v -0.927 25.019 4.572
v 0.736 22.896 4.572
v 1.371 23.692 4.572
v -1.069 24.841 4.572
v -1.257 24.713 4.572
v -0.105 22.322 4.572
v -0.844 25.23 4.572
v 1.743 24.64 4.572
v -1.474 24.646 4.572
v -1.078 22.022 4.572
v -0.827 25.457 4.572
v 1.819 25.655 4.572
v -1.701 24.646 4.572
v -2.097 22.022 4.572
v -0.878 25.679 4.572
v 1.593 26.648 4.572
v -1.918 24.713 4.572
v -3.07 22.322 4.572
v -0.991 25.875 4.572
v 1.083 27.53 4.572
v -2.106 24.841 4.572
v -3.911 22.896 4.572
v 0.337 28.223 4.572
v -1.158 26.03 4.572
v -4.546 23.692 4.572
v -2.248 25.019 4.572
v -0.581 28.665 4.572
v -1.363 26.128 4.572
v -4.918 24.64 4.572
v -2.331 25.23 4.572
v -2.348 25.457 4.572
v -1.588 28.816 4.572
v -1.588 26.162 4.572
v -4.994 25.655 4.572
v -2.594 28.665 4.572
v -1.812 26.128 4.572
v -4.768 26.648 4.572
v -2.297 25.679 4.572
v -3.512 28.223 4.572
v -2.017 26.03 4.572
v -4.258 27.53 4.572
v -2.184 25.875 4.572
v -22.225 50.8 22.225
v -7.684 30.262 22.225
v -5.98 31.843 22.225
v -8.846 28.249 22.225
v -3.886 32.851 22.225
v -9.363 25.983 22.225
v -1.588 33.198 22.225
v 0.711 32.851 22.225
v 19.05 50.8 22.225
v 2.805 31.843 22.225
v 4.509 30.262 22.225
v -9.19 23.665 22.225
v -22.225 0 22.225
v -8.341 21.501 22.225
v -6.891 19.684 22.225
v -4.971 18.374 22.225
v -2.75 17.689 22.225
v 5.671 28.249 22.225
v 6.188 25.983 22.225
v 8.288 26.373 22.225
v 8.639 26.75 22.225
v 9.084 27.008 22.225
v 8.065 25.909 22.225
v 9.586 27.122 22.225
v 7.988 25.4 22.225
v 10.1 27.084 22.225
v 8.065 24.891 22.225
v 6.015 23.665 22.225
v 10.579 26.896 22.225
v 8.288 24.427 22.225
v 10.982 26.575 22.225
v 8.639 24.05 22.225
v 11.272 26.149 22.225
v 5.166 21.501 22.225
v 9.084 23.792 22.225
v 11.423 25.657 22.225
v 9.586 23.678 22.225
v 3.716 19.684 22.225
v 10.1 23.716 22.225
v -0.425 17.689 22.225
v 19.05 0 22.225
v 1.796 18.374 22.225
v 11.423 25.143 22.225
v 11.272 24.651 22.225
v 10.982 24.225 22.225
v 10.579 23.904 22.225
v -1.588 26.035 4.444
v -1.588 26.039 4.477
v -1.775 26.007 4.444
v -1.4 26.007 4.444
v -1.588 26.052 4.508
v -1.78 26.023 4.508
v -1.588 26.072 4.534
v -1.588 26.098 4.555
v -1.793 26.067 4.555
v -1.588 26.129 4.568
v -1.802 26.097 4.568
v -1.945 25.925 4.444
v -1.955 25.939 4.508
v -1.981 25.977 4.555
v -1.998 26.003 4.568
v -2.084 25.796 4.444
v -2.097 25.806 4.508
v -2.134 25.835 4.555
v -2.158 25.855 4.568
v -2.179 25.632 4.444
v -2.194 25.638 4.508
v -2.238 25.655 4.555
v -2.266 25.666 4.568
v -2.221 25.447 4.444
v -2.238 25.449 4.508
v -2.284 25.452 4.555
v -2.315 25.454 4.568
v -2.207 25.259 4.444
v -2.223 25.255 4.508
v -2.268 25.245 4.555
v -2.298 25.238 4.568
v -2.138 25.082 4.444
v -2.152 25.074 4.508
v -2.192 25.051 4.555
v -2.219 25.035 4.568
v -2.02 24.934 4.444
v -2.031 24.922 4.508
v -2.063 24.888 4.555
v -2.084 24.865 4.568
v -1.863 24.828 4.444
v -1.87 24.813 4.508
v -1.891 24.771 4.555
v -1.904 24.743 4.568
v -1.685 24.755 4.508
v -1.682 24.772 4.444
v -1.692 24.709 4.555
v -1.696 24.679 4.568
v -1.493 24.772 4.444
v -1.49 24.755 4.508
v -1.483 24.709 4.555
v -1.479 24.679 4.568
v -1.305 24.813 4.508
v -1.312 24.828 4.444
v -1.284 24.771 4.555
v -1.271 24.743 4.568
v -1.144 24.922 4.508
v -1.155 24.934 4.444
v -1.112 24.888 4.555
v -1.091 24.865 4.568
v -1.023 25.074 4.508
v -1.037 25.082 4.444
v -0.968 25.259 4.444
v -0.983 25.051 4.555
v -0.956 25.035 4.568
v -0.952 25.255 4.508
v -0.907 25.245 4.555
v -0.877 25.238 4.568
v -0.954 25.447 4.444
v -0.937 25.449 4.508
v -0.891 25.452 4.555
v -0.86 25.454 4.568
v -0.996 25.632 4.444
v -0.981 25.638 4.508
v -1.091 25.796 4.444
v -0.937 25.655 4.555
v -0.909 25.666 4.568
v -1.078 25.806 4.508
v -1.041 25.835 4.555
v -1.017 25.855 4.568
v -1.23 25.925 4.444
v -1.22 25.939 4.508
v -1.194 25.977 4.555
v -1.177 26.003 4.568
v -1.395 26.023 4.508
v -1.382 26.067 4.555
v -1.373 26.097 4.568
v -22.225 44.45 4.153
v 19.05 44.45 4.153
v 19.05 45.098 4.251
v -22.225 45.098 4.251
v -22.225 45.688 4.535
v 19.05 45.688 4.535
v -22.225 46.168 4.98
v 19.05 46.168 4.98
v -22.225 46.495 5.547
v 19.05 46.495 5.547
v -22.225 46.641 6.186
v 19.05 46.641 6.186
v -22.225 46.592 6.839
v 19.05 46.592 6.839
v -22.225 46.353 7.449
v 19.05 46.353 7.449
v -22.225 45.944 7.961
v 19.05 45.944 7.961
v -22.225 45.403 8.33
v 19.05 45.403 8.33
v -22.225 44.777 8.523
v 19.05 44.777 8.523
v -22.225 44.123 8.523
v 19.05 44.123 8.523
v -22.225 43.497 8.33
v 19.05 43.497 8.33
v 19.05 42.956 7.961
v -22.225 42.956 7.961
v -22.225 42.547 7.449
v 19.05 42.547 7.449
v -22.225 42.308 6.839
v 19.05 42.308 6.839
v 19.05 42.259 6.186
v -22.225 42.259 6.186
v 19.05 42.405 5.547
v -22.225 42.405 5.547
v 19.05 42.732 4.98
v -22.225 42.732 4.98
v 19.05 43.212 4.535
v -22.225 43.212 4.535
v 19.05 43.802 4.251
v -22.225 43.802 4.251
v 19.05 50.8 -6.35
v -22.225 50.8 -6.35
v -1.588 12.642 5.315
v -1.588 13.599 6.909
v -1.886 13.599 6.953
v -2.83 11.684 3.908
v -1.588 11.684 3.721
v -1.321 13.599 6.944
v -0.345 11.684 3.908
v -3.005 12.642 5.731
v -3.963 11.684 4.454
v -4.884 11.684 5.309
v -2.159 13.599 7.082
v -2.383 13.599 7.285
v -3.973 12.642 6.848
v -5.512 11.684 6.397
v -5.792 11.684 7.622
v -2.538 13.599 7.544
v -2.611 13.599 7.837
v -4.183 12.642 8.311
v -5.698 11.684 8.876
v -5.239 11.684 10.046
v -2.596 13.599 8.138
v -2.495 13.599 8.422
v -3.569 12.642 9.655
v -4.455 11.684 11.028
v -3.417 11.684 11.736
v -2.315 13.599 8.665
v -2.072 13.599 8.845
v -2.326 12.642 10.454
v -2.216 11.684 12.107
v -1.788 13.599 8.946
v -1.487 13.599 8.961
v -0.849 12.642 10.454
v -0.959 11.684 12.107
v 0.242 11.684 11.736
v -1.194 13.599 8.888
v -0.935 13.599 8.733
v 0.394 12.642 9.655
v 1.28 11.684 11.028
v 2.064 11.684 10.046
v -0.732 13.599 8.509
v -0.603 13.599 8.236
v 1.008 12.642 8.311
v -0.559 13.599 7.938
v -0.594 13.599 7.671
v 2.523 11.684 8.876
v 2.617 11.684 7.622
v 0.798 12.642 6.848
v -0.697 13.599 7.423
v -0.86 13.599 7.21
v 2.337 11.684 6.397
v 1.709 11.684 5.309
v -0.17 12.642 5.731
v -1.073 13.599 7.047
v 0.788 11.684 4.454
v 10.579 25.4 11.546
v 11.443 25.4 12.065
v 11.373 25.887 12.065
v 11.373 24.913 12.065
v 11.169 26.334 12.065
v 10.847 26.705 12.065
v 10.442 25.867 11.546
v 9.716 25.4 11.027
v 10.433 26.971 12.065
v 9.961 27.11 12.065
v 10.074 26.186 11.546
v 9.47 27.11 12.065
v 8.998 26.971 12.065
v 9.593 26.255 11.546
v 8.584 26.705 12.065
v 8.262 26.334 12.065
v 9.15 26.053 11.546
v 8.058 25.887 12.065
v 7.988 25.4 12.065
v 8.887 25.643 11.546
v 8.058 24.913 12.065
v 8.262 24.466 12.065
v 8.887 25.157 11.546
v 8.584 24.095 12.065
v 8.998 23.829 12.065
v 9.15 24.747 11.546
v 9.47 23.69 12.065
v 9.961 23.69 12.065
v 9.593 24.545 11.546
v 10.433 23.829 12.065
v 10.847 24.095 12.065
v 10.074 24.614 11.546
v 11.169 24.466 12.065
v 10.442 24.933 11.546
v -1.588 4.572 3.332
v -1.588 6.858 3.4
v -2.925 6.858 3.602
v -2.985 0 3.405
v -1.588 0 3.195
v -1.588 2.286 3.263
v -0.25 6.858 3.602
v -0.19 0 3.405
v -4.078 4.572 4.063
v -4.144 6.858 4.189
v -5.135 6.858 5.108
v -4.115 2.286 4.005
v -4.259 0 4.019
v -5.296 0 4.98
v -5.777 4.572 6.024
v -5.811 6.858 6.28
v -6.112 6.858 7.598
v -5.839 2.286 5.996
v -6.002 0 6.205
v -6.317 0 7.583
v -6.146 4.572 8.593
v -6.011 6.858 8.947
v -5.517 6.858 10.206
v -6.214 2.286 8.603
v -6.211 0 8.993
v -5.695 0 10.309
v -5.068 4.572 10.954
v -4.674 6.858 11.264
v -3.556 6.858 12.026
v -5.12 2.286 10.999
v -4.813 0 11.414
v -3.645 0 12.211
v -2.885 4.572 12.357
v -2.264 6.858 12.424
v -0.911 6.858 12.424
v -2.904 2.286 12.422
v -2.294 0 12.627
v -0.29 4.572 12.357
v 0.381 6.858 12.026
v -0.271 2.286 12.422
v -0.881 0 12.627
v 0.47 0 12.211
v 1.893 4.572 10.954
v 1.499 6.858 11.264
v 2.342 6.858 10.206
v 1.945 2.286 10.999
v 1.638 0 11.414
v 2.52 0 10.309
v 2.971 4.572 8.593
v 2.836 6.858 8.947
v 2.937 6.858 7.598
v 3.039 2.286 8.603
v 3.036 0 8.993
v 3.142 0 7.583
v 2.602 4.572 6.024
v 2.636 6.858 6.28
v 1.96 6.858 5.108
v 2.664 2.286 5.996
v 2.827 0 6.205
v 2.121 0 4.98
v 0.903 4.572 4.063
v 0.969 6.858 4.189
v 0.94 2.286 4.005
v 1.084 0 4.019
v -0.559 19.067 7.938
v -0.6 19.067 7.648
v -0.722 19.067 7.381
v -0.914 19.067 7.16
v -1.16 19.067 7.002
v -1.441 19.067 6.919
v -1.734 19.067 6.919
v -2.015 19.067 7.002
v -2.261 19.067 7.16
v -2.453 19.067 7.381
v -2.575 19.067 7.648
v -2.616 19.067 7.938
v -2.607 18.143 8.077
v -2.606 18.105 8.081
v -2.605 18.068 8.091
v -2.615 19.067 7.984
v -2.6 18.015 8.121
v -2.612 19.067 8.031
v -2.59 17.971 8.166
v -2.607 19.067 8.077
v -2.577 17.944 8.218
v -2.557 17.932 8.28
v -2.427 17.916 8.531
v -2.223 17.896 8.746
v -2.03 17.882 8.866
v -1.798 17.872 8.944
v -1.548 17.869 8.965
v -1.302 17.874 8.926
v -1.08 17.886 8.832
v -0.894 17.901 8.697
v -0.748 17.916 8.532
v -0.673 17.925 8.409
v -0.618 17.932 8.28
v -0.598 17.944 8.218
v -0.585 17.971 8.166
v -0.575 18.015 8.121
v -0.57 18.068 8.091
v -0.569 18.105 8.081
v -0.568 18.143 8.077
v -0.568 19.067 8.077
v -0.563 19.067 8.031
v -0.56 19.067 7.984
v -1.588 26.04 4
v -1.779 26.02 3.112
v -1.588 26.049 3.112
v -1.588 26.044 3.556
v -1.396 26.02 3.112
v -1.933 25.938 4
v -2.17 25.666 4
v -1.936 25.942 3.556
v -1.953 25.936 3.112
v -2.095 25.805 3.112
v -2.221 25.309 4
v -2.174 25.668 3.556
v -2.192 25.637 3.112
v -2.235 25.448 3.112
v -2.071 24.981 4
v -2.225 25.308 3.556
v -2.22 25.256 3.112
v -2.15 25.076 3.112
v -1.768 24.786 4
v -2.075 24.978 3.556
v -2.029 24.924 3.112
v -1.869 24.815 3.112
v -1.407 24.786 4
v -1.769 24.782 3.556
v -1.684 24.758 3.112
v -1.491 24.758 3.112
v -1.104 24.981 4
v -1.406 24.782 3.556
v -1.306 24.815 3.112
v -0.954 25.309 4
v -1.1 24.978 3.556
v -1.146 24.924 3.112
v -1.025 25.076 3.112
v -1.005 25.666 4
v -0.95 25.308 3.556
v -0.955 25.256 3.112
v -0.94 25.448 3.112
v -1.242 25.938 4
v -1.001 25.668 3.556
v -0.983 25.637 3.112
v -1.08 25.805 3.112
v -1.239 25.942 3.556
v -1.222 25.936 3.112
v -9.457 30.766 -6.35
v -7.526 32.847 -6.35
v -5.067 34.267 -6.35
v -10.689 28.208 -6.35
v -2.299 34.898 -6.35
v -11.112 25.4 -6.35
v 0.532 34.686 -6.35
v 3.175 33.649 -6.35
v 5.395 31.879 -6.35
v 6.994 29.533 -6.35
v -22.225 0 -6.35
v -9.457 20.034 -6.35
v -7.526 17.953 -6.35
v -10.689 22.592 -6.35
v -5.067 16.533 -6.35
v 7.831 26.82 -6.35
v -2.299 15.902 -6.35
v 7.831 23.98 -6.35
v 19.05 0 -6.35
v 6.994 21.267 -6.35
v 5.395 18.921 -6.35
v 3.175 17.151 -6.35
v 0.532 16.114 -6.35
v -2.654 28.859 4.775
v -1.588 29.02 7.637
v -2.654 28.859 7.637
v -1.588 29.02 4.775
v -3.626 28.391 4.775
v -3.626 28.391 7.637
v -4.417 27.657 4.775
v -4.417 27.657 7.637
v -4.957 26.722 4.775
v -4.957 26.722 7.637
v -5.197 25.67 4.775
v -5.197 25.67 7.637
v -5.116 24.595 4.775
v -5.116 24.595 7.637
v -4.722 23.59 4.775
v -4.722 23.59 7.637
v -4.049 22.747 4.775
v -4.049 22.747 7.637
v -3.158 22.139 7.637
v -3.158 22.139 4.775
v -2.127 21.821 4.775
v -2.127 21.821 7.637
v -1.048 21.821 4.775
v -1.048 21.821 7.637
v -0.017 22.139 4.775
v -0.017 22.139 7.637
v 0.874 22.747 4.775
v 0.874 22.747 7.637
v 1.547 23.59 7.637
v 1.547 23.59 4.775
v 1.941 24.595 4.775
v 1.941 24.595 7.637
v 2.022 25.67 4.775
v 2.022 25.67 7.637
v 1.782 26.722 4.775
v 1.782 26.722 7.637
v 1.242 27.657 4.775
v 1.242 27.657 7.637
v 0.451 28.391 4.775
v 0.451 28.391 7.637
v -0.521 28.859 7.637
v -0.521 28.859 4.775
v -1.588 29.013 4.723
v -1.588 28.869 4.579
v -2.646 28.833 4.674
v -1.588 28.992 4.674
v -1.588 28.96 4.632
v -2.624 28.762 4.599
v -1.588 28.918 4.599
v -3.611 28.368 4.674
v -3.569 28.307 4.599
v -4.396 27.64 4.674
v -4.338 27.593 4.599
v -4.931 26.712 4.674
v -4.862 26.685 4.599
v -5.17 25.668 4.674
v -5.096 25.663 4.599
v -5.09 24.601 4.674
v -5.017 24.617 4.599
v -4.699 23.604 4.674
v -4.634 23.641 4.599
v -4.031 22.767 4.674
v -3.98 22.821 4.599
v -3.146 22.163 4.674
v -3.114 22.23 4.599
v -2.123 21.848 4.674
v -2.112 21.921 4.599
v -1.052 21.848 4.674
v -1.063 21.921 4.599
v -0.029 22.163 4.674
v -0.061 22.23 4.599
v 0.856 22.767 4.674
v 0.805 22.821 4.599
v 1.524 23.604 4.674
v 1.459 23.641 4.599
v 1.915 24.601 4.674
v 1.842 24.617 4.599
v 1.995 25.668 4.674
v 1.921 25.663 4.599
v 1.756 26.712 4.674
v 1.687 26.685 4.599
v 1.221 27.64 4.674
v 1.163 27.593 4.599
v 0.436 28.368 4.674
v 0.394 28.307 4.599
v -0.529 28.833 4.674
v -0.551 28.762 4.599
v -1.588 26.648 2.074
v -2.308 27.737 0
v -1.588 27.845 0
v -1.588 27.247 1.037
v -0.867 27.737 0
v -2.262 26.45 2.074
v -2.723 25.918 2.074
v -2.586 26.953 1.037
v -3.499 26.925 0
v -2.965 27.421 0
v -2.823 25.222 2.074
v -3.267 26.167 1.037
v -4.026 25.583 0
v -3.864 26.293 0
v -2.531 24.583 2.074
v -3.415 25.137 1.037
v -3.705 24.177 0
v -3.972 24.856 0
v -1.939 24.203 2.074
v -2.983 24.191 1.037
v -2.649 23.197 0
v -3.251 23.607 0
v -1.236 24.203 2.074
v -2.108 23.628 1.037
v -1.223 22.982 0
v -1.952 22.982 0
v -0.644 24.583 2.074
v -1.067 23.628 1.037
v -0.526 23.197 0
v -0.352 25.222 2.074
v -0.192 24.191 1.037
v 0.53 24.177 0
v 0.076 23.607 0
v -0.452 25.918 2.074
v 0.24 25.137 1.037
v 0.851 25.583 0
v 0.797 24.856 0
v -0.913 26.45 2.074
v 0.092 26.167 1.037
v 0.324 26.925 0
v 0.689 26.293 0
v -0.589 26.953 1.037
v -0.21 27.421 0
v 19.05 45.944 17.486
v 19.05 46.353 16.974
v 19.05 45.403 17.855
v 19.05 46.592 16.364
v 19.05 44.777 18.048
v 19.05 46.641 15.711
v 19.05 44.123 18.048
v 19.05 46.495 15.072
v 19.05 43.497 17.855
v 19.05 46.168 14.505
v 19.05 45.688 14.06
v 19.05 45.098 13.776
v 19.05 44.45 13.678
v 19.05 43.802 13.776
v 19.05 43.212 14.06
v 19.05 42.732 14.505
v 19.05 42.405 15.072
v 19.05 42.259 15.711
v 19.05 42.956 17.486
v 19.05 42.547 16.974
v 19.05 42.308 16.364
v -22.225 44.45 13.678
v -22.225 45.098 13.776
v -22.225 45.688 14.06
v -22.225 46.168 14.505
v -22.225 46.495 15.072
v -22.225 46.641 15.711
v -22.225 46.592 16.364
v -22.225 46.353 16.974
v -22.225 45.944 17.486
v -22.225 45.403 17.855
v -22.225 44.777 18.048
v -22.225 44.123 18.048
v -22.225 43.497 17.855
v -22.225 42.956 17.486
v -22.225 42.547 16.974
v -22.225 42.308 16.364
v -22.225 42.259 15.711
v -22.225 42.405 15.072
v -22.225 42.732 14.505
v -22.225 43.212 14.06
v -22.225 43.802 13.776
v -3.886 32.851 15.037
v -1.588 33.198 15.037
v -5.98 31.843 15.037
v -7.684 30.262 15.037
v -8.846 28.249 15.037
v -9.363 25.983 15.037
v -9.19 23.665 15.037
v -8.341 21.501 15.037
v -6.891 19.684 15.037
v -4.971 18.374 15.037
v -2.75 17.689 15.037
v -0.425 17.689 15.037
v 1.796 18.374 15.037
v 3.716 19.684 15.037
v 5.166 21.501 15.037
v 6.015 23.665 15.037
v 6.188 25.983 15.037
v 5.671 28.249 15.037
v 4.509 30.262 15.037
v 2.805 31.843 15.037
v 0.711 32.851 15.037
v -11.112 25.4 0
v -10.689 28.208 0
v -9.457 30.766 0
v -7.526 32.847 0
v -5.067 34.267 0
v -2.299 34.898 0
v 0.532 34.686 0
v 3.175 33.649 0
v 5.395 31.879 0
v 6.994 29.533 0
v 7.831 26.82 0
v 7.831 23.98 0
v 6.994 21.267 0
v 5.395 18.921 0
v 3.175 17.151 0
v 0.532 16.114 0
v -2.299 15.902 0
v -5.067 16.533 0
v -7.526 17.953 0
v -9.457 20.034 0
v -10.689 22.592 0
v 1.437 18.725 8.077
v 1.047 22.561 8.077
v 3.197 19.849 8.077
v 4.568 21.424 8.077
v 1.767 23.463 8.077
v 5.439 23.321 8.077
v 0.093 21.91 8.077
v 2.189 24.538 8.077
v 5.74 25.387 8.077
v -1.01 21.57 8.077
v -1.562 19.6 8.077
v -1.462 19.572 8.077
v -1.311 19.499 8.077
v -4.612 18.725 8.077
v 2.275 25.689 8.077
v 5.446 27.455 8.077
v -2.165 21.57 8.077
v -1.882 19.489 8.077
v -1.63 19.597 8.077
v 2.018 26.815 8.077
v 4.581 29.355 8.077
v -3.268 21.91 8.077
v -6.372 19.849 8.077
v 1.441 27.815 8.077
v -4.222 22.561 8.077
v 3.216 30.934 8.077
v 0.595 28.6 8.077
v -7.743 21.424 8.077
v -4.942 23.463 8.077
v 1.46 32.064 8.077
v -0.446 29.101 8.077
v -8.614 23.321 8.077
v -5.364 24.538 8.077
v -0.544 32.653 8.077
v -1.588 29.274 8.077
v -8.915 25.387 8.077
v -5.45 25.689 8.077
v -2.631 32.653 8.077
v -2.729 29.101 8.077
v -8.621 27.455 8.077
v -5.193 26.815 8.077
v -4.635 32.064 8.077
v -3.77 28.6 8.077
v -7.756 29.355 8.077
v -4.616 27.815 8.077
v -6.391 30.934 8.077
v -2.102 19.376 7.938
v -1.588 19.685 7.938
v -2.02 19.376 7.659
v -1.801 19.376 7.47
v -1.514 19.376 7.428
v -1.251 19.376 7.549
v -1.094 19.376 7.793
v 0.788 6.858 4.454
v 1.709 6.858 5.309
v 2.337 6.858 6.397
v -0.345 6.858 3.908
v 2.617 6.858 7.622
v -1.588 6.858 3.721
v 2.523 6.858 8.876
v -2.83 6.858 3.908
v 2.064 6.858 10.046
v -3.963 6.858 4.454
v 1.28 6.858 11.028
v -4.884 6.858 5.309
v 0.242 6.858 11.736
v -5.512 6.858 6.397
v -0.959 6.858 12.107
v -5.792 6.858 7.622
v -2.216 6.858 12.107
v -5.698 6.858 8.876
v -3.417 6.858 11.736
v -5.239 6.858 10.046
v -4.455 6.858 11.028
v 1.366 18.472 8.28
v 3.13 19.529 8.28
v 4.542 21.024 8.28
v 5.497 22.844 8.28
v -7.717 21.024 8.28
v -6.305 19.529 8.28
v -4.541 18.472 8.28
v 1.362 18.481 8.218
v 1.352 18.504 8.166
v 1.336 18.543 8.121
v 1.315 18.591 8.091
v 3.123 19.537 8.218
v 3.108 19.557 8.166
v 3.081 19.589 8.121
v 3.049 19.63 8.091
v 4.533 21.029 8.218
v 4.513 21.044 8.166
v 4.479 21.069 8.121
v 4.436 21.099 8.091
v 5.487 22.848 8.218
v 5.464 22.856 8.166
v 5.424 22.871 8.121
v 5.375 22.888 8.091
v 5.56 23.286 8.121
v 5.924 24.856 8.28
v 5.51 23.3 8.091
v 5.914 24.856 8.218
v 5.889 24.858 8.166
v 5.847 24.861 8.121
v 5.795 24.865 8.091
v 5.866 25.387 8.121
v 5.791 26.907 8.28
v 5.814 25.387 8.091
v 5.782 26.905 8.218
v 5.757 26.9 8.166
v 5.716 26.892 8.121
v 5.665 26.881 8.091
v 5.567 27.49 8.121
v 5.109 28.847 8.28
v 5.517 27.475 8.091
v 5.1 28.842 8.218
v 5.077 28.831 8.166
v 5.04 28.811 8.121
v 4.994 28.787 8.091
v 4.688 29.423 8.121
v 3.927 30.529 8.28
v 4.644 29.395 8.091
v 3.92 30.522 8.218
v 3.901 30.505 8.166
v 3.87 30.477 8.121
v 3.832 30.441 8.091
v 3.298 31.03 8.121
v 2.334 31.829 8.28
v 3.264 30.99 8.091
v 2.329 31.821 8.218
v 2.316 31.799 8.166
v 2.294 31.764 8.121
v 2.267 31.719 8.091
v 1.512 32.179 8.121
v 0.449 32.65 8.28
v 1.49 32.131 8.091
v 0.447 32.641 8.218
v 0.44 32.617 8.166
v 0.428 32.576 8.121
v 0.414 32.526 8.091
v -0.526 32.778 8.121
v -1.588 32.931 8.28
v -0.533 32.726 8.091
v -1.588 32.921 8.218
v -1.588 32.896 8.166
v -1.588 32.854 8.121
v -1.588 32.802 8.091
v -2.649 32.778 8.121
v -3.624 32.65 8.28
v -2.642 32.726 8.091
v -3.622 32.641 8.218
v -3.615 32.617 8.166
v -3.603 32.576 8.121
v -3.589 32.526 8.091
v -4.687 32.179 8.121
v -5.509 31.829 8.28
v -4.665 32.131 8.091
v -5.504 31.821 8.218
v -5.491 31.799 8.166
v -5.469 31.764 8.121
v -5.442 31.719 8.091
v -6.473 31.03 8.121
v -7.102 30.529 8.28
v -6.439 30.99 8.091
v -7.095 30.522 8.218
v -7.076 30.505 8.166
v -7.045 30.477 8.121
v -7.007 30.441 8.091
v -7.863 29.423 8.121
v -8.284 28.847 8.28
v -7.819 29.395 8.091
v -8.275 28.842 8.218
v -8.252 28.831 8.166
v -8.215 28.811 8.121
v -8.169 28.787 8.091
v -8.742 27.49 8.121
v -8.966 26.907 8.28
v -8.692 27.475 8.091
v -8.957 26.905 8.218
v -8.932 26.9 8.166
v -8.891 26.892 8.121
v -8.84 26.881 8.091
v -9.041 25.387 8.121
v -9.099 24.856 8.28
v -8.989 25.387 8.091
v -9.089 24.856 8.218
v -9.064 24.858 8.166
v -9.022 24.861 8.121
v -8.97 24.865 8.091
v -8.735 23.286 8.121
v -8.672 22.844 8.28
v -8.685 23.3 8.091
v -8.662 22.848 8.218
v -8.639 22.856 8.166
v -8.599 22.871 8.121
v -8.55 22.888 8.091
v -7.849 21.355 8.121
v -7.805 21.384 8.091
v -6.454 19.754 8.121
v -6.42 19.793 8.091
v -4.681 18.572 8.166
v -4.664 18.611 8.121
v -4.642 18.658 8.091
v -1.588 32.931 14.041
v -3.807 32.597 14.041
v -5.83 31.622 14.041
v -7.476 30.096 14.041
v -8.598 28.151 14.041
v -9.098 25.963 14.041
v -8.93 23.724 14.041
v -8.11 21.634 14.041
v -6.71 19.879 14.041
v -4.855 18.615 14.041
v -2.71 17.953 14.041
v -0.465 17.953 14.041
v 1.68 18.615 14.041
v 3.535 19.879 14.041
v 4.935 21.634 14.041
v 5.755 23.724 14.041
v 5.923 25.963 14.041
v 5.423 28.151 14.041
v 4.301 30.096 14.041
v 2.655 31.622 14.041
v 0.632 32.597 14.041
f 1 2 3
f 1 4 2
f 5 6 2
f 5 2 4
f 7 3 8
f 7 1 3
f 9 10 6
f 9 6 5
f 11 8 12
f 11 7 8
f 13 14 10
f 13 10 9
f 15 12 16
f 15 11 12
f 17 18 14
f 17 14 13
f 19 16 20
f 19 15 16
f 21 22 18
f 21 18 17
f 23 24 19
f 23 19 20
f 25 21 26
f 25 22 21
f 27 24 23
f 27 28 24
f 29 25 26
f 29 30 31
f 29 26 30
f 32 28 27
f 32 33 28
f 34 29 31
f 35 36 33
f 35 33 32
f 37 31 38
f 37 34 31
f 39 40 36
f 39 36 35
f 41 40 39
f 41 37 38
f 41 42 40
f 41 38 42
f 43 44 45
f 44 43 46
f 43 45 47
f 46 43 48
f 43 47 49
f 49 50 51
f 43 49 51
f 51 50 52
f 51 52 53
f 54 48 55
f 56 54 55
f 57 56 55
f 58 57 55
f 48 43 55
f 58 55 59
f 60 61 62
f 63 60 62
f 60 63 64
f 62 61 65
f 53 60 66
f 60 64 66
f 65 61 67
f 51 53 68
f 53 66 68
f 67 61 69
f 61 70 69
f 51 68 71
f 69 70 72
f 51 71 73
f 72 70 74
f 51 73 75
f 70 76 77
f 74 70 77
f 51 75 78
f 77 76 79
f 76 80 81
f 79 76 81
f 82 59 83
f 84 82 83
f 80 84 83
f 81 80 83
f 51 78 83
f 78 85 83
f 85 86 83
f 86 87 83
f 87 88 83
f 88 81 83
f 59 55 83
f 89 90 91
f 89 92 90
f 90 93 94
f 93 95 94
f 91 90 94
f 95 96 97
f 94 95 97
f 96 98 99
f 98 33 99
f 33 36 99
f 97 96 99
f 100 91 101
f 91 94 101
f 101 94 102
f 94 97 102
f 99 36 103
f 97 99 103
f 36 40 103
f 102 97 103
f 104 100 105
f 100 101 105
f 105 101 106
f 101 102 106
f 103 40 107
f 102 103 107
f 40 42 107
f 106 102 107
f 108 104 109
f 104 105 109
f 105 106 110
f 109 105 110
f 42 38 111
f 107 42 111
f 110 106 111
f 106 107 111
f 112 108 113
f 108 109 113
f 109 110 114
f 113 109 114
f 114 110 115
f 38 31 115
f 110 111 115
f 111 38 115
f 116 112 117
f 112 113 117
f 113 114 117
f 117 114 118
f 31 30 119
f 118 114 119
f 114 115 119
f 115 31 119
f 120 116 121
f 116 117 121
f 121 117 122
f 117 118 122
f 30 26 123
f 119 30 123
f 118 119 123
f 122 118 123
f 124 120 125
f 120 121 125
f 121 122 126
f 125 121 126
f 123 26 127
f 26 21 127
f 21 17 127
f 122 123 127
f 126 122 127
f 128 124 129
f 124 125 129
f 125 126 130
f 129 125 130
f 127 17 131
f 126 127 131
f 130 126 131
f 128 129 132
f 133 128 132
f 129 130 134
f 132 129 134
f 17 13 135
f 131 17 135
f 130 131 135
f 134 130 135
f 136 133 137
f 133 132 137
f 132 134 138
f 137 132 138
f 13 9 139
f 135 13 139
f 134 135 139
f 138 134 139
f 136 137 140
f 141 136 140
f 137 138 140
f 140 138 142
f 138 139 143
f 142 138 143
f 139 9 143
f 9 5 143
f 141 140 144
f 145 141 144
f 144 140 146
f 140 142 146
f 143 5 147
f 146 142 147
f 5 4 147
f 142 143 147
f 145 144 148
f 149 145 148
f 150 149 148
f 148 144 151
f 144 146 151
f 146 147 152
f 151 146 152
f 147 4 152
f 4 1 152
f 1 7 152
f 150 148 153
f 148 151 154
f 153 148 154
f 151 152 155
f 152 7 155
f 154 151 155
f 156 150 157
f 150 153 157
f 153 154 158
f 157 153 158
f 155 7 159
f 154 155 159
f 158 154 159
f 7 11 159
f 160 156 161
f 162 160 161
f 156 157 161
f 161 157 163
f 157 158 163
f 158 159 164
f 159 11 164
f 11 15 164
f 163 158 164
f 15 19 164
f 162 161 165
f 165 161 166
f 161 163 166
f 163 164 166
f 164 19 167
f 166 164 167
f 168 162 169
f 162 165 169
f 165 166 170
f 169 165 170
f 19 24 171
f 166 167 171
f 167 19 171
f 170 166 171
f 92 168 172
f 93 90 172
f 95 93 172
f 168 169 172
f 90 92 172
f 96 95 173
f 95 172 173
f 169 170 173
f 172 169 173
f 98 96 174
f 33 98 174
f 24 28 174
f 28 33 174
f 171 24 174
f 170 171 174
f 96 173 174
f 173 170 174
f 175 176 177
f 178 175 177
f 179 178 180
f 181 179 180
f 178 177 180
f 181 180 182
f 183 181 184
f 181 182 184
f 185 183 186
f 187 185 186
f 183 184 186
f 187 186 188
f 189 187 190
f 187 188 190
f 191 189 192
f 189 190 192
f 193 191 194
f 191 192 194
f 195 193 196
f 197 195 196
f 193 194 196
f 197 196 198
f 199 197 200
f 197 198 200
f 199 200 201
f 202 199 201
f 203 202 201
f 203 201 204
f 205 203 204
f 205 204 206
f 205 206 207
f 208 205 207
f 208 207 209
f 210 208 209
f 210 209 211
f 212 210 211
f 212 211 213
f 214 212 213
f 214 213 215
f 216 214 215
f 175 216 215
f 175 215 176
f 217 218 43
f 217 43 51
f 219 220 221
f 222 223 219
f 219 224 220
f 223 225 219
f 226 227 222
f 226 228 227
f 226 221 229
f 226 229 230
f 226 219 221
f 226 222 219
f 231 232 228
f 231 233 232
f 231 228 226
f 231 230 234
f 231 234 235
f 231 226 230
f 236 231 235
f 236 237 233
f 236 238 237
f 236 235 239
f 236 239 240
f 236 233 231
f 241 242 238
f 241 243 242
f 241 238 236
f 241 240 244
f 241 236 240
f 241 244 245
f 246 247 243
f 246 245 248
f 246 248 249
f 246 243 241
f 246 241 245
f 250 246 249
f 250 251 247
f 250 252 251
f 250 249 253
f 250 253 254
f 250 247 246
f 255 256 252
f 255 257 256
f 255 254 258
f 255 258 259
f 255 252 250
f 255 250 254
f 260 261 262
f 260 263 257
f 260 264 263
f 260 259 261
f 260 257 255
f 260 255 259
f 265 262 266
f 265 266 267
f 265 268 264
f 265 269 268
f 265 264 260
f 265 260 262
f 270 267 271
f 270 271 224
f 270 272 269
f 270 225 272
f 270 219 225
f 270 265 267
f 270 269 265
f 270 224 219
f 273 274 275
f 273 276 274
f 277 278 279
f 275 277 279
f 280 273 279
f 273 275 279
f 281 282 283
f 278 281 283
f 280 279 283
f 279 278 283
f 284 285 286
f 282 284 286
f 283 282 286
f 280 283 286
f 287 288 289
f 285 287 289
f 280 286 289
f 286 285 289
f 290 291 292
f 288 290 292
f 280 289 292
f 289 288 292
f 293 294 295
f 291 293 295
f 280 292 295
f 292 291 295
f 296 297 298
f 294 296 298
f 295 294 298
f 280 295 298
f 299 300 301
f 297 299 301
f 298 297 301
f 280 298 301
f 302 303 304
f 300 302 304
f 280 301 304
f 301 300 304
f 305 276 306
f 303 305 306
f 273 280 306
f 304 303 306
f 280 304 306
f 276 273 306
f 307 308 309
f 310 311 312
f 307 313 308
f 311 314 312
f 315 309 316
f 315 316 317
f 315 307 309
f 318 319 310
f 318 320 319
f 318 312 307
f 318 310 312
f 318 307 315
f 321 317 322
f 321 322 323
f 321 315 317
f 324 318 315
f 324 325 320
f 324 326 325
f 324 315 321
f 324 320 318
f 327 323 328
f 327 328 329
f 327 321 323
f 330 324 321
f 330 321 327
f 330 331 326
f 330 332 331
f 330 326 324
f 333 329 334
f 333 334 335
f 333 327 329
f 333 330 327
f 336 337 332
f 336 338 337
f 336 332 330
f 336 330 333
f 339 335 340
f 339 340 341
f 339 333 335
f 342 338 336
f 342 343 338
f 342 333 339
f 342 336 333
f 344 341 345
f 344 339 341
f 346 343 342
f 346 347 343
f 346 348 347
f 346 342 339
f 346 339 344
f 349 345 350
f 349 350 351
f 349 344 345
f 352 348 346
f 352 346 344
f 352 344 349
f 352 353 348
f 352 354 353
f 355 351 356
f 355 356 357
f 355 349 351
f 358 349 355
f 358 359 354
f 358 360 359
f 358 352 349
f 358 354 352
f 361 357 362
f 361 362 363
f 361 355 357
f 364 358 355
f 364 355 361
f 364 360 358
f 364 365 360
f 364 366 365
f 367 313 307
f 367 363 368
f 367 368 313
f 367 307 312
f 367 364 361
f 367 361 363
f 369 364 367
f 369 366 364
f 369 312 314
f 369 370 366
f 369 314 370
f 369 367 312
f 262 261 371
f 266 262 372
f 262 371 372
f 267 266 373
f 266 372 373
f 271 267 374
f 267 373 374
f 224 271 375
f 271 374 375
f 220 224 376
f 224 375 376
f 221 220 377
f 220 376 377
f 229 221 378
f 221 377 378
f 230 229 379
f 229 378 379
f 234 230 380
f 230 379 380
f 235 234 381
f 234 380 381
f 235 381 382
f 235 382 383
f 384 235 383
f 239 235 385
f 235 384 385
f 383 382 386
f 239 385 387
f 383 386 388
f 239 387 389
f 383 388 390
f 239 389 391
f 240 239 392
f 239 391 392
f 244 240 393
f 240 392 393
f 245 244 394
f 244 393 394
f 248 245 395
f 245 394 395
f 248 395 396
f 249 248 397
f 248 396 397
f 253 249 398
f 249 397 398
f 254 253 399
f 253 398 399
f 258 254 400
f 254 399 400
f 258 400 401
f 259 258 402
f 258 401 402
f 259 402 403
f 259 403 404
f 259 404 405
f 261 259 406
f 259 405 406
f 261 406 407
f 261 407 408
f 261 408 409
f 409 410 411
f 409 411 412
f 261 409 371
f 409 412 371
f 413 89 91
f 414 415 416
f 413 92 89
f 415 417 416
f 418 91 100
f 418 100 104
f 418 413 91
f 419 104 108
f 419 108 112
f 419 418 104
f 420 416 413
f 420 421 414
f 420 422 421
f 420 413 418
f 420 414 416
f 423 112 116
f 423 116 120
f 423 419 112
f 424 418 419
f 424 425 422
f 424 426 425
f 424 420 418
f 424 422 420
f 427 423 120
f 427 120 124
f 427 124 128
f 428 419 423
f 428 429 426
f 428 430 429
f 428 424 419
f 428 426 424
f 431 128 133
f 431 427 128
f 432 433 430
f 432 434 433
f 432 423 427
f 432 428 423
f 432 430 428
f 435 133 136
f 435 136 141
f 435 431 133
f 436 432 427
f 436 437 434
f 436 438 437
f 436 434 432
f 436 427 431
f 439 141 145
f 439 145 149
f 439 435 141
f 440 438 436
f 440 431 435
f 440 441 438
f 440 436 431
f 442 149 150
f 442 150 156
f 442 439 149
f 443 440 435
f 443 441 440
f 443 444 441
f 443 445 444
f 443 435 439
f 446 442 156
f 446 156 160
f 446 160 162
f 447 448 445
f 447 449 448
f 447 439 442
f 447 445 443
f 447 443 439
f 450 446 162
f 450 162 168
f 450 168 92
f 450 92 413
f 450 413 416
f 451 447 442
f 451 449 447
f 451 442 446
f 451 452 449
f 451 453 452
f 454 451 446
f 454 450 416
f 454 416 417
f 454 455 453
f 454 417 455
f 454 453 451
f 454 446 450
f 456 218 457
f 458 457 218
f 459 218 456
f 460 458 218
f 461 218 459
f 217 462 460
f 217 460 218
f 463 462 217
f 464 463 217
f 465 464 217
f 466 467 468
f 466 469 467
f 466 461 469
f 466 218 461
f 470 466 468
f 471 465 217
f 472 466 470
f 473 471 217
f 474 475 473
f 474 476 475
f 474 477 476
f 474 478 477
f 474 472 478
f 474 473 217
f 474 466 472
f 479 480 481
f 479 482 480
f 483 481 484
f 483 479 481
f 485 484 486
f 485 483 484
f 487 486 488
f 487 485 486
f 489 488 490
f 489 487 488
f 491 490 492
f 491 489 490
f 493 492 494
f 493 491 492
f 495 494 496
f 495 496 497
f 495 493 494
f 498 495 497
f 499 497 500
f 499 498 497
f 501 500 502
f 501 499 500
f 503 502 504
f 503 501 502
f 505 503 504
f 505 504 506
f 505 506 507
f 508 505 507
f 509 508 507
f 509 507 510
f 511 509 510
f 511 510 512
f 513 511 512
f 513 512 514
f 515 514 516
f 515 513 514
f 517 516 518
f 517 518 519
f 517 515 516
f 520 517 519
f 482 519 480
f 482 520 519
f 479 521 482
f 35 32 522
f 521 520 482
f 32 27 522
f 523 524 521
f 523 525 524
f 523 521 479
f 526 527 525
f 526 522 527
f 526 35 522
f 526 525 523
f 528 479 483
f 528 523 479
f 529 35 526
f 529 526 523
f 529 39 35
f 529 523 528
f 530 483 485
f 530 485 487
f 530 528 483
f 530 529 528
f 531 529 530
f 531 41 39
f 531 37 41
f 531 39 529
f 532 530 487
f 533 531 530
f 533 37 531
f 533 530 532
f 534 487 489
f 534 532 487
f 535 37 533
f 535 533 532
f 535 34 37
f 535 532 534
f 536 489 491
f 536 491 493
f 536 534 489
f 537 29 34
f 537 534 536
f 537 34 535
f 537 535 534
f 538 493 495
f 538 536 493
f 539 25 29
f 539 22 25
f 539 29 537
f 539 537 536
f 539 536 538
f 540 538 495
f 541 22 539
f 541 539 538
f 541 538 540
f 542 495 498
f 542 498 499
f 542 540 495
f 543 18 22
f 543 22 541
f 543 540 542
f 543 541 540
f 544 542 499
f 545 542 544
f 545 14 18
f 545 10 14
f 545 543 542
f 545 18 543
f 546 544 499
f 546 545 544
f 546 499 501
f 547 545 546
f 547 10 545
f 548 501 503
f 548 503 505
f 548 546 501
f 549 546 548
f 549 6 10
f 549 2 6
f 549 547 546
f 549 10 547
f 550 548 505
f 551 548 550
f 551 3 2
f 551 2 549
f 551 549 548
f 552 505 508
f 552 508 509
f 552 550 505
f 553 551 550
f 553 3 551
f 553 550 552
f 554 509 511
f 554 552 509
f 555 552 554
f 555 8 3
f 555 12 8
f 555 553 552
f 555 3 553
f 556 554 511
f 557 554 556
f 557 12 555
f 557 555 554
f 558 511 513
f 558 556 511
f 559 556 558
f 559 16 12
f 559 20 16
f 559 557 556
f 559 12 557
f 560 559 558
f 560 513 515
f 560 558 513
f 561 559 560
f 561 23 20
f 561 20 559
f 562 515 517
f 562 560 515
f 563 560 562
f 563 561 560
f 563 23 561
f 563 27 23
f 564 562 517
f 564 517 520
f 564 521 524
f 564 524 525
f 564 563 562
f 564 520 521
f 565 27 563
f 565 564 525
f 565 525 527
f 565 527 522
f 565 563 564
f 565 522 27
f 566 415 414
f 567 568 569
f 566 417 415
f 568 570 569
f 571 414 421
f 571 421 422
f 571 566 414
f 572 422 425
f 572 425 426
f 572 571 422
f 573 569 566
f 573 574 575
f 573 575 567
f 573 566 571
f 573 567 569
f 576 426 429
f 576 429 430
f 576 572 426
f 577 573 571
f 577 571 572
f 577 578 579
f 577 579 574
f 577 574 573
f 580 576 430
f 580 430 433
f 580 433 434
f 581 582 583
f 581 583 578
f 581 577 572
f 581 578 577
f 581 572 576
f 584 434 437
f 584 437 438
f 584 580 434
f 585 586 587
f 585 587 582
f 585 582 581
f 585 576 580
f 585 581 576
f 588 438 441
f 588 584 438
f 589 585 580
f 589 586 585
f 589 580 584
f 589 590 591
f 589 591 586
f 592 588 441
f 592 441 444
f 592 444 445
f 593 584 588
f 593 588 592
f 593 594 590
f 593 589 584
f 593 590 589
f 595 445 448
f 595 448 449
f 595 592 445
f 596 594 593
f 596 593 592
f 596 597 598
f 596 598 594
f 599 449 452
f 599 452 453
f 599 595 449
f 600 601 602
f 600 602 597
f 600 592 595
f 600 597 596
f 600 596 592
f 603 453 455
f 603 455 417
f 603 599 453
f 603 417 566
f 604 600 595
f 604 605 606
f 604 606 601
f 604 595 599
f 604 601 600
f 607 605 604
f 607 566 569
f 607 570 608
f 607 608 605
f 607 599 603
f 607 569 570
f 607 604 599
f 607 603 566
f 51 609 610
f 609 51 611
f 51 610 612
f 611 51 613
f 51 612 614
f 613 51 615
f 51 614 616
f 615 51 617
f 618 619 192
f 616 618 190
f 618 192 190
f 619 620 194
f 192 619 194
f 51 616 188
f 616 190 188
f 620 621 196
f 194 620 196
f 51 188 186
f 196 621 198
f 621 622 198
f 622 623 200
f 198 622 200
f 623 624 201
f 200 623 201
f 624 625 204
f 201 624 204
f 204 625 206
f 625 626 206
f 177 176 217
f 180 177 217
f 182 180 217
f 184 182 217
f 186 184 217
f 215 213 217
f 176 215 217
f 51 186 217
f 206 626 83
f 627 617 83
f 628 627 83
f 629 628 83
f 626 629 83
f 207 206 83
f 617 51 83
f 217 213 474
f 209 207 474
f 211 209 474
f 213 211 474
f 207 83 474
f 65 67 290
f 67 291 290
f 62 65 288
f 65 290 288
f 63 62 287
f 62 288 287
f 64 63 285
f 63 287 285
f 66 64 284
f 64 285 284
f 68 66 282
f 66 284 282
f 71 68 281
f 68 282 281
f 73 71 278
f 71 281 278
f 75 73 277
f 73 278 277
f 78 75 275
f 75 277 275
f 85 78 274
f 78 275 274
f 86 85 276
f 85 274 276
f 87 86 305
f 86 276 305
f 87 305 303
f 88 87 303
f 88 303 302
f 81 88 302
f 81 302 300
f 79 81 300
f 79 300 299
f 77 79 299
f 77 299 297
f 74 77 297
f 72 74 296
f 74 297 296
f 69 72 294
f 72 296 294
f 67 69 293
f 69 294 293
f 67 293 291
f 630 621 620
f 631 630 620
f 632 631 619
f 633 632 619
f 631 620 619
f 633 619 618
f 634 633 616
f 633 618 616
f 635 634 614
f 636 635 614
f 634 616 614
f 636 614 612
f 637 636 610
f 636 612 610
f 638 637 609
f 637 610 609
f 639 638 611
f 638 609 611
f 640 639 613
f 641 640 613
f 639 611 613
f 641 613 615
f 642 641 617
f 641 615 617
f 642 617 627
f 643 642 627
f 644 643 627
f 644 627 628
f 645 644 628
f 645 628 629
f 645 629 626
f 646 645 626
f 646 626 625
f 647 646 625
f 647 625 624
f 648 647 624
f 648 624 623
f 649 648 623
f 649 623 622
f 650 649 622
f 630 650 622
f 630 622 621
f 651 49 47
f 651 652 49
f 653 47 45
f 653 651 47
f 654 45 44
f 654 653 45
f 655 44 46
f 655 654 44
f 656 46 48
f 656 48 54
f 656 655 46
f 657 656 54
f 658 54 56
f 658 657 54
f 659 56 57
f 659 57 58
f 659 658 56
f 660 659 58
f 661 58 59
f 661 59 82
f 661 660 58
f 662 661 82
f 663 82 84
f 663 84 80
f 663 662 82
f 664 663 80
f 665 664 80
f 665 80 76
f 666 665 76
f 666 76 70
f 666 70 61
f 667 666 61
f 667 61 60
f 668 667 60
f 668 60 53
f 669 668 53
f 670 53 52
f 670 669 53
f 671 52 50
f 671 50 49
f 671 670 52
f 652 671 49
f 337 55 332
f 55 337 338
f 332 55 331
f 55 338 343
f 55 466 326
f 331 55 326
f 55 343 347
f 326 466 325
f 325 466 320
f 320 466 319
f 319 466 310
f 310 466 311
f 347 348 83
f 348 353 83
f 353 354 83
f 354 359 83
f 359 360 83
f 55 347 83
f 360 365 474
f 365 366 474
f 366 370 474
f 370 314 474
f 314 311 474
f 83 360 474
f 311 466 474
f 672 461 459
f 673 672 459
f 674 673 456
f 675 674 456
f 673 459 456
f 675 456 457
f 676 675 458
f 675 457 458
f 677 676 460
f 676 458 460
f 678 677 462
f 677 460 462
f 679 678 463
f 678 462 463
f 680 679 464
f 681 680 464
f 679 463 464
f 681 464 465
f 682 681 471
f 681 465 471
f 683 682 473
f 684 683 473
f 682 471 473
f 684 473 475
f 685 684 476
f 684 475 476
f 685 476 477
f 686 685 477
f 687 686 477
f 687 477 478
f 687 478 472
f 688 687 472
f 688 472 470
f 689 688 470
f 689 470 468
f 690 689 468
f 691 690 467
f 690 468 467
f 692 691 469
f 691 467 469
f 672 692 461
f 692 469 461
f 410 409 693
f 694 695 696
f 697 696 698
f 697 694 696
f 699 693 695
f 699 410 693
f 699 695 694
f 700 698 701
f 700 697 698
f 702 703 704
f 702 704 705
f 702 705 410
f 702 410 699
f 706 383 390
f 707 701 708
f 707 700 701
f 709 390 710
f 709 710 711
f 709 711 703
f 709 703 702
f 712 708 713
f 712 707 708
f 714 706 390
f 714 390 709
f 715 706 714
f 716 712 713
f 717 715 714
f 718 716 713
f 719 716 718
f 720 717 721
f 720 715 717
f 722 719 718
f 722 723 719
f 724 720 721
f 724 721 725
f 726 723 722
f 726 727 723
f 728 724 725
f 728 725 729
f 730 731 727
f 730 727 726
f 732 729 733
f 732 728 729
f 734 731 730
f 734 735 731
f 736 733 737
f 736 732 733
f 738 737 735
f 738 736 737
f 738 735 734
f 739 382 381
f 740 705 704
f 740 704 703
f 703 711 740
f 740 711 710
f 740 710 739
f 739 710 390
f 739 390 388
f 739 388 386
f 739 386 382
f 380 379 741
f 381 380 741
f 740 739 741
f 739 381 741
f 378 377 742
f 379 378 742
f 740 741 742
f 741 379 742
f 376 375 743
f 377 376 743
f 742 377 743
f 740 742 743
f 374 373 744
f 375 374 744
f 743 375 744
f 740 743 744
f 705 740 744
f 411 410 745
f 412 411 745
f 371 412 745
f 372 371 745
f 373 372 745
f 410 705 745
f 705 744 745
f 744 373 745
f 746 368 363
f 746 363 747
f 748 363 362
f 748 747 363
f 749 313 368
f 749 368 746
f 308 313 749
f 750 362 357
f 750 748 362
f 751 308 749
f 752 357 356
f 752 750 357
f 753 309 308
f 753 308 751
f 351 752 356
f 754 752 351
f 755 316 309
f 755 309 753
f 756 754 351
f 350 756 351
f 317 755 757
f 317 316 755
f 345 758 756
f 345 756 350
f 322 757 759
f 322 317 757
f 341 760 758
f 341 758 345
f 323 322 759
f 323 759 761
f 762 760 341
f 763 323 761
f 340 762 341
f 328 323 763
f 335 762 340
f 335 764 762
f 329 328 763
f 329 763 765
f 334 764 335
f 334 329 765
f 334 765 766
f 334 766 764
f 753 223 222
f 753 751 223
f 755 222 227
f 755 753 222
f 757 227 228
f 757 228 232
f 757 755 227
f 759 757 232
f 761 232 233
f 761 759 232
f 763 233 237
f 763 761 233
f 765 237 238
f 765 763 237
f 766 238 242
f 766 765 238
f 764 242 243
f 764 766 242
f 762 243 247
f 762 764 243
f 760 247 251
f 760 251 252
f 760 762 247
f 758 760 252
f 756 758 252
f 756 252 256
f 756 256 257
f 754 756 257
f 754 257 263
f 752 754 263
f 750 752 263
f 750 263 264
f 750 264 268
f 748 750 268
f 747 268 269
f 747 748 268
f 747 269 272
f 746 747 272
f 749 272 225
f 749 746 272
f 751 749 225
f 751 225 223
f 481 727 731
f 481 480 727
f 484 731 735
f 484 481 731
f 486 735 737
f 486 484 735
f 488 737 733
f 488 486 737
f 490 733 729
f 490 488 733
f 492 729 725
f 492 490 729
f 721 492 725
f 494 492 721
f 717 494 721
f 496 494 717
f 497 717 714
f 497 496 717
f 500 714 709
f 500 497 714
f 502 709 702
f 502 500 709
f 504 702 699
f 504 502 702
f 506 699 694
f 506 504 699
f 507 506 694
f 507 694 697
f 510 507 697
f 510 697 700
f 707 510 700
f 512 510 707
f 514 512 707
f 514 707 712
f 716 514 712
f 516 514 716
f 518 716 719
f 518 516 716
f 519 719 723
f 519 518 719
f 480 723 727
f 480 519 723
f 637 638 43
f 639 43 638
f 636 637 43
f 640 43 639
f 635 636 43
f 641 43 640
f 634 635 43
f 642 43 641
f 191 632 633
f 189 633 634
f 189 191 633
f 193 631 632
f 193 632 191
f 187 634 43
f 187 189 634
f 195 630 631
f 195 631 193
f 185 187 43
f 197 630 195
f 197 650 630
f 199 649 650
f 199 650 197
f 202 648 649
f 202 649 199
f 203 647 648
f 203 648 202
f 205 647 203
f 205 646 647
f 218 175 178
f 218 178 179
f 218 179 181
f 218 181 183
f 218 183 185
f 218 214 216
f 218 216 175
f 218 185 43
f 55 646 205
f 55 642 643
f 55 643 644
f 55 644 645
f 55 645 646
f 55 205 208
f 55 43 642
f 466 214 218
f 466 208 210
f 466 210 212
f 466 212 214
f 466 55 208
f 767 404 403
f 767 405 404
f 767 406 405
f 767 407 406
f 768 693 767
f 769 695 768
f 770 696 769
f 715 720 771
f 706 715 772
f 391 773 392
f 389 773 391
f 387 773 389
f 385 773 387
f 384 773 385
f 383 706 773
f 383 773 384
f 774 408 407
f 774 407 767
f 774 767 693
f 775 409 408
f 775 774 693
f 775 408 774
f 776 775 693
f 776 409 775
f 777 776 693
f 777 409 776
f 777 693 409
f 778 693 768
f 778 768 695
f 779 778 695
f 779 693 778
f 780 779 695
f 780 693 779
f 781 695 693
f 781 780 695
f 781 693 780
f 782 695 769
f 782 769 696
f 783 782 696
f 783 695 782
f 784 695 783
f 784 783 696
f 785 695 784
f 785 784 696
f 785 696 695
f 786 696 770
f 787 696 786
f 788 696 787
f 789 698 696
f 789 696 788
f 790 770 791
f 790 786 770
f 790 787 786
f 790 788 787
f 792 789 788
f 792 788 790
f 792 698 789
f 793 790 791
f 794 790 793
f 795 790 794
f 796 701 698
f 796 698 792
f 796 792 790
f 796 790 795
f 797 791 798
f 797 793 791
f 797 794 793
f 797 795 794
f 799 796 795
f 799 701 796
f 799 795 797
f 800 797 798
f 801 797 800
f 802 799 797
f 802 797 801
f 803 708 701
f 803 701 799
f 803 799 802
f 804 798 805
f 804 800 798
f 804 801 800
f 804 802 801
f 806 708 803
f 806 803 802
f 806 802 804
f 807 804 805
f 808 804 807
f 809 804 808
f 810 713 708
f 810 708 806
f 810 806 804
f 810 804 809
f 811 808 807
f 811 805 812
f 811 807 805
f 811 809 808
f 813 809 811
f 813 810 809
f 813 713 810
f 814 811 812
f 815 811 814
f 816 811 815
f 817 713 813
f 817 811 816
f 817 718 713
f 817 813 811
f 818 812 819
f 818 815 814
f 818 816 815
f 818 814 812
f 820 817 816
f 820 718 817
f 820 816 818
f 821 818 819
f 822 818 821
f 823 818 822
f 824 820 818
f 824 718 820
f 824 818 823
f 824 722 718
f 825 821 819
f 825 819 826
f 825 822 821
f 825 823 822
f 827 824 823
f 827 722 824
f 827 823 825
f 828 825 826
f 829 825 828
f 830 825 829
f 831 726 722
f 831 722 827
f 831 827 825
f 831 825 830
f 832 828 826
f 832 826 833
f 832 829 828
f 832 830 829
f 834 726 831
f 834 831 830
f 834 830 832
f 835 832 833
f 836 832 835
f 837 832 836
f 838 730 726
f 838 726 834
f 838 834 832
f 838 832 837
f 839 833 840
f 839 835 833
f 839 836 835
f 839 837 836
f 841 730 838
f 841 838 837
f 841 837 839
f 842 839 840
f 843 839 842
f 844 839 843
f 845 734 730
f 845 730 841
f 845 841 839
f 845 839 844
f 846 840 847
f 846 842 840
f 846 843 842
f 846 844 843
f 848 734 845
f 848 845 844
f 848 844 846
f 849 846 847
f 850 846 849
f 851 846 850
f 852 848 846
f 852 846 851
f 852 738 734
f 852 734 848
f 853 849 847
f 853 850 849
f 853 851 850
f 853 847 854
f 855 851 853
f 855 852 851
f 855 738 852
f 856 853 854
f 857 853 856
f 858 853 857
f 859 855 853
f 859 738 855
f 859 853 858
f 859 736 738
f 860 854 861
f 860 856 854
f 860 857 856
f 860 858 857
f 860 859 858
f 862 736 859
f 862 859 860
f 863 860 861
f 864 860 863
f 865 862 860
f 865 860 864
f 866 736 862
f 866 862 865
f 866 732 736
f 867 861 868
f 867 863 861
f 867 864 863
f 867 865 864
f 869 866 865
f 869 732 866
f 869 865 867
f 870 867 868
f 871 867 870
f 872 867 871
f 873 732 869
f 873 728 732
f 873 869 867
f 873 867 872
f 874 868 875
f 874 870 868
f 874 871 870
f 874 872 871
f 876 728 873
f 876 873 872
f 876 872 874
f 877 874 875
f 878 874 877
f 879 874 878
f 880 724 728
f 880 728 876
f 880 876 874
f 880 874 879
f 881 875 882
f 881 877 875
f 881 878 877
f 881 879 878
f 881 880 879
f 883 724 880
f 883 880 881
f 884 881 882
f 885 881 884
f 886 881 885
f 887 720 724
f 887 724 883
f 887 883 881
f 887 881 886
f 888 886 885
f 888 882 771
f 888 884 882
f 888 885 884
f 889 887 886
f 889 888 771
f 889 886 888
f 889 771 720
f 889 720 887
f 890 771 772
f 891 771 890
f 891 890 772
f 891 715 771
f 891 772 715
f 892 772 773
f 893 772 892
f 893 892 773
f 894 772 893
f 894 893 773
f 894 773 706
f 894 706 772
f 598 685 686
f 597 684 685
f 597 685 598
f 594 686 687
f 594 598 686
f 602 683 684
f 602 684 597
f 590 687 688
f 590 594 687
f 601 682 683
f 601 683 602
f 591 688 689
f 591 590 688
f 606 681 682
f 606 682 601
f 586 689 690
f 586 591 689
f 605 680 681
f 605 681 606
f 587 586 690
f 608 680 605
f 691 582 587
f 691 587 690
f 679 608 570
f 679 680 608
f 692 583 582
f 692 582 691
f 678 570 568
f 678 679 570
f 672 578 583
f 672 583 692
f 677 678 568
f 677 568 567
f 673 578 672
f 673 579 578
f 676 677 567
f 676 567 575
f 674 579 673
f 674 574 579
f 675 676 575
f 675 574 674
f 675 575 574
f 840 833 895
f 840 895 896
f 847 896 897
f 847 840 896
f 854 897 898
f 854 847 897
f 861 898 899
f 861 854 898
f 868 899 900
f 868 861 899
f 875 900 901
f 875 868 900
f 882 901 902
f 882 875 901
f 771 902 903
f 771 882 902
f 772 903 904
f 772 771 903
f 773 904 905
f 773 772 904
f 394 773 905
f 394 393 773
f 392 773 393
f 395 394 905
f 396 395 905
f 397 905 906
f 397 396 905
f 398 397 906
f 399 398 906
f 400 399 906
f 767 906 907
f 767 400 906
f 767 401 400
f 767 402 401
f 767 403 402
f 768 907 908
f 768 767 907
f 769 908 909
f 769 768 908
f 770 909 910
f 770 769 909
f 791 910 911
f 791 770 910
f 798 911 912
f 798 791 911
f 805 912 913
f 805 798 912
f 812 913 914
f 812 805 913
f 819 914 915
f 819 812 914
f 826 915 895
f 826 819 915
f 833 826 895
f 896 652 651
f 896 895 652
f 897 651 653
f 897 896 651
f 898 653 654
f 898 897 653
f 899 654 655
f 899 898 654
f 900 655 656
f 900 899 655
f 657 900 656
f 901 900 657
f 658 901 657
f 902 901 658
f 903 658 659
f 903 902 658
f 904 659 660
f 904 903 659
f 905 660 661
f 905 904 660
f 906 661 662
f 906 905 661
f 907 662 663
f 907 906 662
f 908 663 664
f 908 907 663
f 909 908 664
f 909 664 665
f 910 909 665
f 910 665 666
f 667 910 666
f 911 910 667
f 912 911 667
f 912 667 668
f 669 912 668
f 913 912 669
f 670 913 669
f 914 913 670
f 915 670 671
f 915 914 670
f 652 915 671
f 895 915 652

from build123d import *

# Parameters (mm, degrees)
SKETCH7_W                       = 41.275
SKETCH7_H                       = 28.575
BOSS_EXTRUDE2_DEPTH             = 50.8
SKETCH31_R                      = 9.525
CUT_EXTRUDE1_DEPTH              = 6.35
FILLET3_R                       = 0.127
F_8_32_TAPPED_HOLE1_D           = 3.4544
F_8_32_TAPPED_HOLE1_DEPTH       = 10.16
F_8_32_TAPPED_HOLE1_TIP         = 1.037806461
F_17_0_173_DIAMETER_HOLE1_D     = 4.3942
F_46_0_081_DIAMETER_HOLE1_D     = 2.0574
F_46_0_081_DIAMETER_HOLE1_DEPTH = 19.066894681
F_46_0_081_DIAMETER_HOLE1_TIP   = 0.618105319


with BuildPart() as part:
    # Sketch7 → Boss-Extrude2 (new body)
    with BuildSketch(Plane(origin=(0, 0, 0), x_dir=(1, 0, 0), z_dir=(0, 1, 0))):
        with Locations((-1.5875, -7.9375)):
            Rectangle(SKETCH7_W, SKETCH7_H)
    extrude(amount=BOSS_EXTRUDE2_DEPTH)

    # Sketch31 → Cut-Extrude1 (cut)
    with BuildSketch(Plane(origin=(0, 0, -6.35), x_dir=(-1, 0, 0), z_dir=(0, 0, -1))):
        with Locations((1.5875, 25.4)):
            Circle(SKETCH31_R)
    extrude(amount=-CUT_EXTRUDE1_DEPTH, mode=Mode.SUBTRACT)

    # Sketch24 → Port Manifold (revolve, cut)
    with BuildSketch(Plane.ZY.offset(1.5875)):
        with BuildLine():
            Line((22.225, 25.4), (22.225, 33.1978))
            Line((22.225, 33.1978), (15.0368, 33.1978))
            Line((15.0368, 33.1978), (14.04146205, 32.9311))
            Line((14.04146205, 32.9311), (8.2804, 32.9311))
            ThreePointArc((8.2804, 32.9311), (8.136715902, 32.871584098), (8.0772, 32.7279))
            Line((8.0772, 32.7279), (8.0772, 29.2735))
            Line((8.0772, 29.2735), (7.637259095, 29.0195))
            Line((7.637259095, 29.0195), (4.7752, 29.0195))
            ThreePointArc((4.7752, 29.0195), (4.631515902, 28.959984098), (4.572, 28.8163))
            Line((4.572, 28.8163), (4.572, 26.034032808))
            Line((4.572, 26.034032808), (3.111576387, 26.04897))
            Line((3.111576387, 26.04897), (-0.714966433, 28.258225527))
            Line((-0.714966433, 28.258225527), (-0.714966433, 25.4))
            Line((-0.714966433, 25.4), (22.225, 25.4))
        make_face()
    revolve(axis=Axis((-1.5875, 25.4, -0.714966433), (0, 0, 1)), mode=Mode.SUBTRACT)

    # Fillet3
    fillet3_edges = [part.edges().sort_by_distance(p)[0] for p in [
        (-1.5875, 24.765967192, 4.572),
    ]]
    fillet(fillet3_edges, radius=FILLET3_R)

    # #8-32 Tapped Hole1
    with Locations(Plane.XY.offset(22.225)):
        with Locations((9.7155, 25.4)):
            Hole(F_8_32_TAPPED_HOLE1_D / 2, depth=F_8_32_TAPPED_HOLE1_DEPTH)
            with Locations((0, 0, -(F_8_32_TAPPED_HOLE1_DEPTH + F_8_32_TAPPED_HOLE1_TIP / 2))):  # 118° drill point
                Cone(0, F_8_32_TAPPED_HOLE1_D / 2, F_8_32_TAPPED_HOLE1_TIP, mode=Mode.SUBTRACT)

    # Sketch29 → 1/8 NPT Tapped Hole1 (revolve, cut)
    with BuildSketch(Plane(origin=(-1.5875, 0, 7.9375), x_dir=(0, 0, -1), z_dir=(1, 0, 0))):
        Polygon((0, 0), (0, 14.217468714), (4.2164, 11.684), (4.2164, 6.858), (4.537401096, 6.858), (4.7427388, 0), align=None)
    revolve(axis=Axis((-1.5875, -6.35, 7.9375), (0, 1, 0)), mode=Mode.SUBTRACT)

    # #17 (0.173) Diameter Hole1 (through all)
    with Locations(Plane.ZY.offset(22.225)):
        with Locations((6.35, 44.45), (15.875, 44.45)):
            Hole(F_17_0_173_DIAMETER_HOLE1_D / 2)

    # #46 (0.081) Diameter Hole1
    with Locations(Plane(origin=(0, 0, 0), x_dir=(-1, 0, 0), z_dir=(0, -1, 0))):
        with Locations((1.5875, -7.9375)):
            Hole(F_46_0_081_DIAMETER_HOLE1_D / 2, depth=F_46_0_081_DIAMETER_HOLE1_DEPTH)
            with Locations((0, 0, -(F_46_0_081_DIAMETER_HOLE1_DEPTH + F_46_0_081_DIAMETER_HOLE1_TIP / 2))):  # 118° drill point
                Cone(0, F_46_0_081_DIAMETER_HOLE1_D / 2, F_46_0_081_DIAMETER_HOLE1_TIP, mode=Mode.SUBTRACT)


solid = part.part
